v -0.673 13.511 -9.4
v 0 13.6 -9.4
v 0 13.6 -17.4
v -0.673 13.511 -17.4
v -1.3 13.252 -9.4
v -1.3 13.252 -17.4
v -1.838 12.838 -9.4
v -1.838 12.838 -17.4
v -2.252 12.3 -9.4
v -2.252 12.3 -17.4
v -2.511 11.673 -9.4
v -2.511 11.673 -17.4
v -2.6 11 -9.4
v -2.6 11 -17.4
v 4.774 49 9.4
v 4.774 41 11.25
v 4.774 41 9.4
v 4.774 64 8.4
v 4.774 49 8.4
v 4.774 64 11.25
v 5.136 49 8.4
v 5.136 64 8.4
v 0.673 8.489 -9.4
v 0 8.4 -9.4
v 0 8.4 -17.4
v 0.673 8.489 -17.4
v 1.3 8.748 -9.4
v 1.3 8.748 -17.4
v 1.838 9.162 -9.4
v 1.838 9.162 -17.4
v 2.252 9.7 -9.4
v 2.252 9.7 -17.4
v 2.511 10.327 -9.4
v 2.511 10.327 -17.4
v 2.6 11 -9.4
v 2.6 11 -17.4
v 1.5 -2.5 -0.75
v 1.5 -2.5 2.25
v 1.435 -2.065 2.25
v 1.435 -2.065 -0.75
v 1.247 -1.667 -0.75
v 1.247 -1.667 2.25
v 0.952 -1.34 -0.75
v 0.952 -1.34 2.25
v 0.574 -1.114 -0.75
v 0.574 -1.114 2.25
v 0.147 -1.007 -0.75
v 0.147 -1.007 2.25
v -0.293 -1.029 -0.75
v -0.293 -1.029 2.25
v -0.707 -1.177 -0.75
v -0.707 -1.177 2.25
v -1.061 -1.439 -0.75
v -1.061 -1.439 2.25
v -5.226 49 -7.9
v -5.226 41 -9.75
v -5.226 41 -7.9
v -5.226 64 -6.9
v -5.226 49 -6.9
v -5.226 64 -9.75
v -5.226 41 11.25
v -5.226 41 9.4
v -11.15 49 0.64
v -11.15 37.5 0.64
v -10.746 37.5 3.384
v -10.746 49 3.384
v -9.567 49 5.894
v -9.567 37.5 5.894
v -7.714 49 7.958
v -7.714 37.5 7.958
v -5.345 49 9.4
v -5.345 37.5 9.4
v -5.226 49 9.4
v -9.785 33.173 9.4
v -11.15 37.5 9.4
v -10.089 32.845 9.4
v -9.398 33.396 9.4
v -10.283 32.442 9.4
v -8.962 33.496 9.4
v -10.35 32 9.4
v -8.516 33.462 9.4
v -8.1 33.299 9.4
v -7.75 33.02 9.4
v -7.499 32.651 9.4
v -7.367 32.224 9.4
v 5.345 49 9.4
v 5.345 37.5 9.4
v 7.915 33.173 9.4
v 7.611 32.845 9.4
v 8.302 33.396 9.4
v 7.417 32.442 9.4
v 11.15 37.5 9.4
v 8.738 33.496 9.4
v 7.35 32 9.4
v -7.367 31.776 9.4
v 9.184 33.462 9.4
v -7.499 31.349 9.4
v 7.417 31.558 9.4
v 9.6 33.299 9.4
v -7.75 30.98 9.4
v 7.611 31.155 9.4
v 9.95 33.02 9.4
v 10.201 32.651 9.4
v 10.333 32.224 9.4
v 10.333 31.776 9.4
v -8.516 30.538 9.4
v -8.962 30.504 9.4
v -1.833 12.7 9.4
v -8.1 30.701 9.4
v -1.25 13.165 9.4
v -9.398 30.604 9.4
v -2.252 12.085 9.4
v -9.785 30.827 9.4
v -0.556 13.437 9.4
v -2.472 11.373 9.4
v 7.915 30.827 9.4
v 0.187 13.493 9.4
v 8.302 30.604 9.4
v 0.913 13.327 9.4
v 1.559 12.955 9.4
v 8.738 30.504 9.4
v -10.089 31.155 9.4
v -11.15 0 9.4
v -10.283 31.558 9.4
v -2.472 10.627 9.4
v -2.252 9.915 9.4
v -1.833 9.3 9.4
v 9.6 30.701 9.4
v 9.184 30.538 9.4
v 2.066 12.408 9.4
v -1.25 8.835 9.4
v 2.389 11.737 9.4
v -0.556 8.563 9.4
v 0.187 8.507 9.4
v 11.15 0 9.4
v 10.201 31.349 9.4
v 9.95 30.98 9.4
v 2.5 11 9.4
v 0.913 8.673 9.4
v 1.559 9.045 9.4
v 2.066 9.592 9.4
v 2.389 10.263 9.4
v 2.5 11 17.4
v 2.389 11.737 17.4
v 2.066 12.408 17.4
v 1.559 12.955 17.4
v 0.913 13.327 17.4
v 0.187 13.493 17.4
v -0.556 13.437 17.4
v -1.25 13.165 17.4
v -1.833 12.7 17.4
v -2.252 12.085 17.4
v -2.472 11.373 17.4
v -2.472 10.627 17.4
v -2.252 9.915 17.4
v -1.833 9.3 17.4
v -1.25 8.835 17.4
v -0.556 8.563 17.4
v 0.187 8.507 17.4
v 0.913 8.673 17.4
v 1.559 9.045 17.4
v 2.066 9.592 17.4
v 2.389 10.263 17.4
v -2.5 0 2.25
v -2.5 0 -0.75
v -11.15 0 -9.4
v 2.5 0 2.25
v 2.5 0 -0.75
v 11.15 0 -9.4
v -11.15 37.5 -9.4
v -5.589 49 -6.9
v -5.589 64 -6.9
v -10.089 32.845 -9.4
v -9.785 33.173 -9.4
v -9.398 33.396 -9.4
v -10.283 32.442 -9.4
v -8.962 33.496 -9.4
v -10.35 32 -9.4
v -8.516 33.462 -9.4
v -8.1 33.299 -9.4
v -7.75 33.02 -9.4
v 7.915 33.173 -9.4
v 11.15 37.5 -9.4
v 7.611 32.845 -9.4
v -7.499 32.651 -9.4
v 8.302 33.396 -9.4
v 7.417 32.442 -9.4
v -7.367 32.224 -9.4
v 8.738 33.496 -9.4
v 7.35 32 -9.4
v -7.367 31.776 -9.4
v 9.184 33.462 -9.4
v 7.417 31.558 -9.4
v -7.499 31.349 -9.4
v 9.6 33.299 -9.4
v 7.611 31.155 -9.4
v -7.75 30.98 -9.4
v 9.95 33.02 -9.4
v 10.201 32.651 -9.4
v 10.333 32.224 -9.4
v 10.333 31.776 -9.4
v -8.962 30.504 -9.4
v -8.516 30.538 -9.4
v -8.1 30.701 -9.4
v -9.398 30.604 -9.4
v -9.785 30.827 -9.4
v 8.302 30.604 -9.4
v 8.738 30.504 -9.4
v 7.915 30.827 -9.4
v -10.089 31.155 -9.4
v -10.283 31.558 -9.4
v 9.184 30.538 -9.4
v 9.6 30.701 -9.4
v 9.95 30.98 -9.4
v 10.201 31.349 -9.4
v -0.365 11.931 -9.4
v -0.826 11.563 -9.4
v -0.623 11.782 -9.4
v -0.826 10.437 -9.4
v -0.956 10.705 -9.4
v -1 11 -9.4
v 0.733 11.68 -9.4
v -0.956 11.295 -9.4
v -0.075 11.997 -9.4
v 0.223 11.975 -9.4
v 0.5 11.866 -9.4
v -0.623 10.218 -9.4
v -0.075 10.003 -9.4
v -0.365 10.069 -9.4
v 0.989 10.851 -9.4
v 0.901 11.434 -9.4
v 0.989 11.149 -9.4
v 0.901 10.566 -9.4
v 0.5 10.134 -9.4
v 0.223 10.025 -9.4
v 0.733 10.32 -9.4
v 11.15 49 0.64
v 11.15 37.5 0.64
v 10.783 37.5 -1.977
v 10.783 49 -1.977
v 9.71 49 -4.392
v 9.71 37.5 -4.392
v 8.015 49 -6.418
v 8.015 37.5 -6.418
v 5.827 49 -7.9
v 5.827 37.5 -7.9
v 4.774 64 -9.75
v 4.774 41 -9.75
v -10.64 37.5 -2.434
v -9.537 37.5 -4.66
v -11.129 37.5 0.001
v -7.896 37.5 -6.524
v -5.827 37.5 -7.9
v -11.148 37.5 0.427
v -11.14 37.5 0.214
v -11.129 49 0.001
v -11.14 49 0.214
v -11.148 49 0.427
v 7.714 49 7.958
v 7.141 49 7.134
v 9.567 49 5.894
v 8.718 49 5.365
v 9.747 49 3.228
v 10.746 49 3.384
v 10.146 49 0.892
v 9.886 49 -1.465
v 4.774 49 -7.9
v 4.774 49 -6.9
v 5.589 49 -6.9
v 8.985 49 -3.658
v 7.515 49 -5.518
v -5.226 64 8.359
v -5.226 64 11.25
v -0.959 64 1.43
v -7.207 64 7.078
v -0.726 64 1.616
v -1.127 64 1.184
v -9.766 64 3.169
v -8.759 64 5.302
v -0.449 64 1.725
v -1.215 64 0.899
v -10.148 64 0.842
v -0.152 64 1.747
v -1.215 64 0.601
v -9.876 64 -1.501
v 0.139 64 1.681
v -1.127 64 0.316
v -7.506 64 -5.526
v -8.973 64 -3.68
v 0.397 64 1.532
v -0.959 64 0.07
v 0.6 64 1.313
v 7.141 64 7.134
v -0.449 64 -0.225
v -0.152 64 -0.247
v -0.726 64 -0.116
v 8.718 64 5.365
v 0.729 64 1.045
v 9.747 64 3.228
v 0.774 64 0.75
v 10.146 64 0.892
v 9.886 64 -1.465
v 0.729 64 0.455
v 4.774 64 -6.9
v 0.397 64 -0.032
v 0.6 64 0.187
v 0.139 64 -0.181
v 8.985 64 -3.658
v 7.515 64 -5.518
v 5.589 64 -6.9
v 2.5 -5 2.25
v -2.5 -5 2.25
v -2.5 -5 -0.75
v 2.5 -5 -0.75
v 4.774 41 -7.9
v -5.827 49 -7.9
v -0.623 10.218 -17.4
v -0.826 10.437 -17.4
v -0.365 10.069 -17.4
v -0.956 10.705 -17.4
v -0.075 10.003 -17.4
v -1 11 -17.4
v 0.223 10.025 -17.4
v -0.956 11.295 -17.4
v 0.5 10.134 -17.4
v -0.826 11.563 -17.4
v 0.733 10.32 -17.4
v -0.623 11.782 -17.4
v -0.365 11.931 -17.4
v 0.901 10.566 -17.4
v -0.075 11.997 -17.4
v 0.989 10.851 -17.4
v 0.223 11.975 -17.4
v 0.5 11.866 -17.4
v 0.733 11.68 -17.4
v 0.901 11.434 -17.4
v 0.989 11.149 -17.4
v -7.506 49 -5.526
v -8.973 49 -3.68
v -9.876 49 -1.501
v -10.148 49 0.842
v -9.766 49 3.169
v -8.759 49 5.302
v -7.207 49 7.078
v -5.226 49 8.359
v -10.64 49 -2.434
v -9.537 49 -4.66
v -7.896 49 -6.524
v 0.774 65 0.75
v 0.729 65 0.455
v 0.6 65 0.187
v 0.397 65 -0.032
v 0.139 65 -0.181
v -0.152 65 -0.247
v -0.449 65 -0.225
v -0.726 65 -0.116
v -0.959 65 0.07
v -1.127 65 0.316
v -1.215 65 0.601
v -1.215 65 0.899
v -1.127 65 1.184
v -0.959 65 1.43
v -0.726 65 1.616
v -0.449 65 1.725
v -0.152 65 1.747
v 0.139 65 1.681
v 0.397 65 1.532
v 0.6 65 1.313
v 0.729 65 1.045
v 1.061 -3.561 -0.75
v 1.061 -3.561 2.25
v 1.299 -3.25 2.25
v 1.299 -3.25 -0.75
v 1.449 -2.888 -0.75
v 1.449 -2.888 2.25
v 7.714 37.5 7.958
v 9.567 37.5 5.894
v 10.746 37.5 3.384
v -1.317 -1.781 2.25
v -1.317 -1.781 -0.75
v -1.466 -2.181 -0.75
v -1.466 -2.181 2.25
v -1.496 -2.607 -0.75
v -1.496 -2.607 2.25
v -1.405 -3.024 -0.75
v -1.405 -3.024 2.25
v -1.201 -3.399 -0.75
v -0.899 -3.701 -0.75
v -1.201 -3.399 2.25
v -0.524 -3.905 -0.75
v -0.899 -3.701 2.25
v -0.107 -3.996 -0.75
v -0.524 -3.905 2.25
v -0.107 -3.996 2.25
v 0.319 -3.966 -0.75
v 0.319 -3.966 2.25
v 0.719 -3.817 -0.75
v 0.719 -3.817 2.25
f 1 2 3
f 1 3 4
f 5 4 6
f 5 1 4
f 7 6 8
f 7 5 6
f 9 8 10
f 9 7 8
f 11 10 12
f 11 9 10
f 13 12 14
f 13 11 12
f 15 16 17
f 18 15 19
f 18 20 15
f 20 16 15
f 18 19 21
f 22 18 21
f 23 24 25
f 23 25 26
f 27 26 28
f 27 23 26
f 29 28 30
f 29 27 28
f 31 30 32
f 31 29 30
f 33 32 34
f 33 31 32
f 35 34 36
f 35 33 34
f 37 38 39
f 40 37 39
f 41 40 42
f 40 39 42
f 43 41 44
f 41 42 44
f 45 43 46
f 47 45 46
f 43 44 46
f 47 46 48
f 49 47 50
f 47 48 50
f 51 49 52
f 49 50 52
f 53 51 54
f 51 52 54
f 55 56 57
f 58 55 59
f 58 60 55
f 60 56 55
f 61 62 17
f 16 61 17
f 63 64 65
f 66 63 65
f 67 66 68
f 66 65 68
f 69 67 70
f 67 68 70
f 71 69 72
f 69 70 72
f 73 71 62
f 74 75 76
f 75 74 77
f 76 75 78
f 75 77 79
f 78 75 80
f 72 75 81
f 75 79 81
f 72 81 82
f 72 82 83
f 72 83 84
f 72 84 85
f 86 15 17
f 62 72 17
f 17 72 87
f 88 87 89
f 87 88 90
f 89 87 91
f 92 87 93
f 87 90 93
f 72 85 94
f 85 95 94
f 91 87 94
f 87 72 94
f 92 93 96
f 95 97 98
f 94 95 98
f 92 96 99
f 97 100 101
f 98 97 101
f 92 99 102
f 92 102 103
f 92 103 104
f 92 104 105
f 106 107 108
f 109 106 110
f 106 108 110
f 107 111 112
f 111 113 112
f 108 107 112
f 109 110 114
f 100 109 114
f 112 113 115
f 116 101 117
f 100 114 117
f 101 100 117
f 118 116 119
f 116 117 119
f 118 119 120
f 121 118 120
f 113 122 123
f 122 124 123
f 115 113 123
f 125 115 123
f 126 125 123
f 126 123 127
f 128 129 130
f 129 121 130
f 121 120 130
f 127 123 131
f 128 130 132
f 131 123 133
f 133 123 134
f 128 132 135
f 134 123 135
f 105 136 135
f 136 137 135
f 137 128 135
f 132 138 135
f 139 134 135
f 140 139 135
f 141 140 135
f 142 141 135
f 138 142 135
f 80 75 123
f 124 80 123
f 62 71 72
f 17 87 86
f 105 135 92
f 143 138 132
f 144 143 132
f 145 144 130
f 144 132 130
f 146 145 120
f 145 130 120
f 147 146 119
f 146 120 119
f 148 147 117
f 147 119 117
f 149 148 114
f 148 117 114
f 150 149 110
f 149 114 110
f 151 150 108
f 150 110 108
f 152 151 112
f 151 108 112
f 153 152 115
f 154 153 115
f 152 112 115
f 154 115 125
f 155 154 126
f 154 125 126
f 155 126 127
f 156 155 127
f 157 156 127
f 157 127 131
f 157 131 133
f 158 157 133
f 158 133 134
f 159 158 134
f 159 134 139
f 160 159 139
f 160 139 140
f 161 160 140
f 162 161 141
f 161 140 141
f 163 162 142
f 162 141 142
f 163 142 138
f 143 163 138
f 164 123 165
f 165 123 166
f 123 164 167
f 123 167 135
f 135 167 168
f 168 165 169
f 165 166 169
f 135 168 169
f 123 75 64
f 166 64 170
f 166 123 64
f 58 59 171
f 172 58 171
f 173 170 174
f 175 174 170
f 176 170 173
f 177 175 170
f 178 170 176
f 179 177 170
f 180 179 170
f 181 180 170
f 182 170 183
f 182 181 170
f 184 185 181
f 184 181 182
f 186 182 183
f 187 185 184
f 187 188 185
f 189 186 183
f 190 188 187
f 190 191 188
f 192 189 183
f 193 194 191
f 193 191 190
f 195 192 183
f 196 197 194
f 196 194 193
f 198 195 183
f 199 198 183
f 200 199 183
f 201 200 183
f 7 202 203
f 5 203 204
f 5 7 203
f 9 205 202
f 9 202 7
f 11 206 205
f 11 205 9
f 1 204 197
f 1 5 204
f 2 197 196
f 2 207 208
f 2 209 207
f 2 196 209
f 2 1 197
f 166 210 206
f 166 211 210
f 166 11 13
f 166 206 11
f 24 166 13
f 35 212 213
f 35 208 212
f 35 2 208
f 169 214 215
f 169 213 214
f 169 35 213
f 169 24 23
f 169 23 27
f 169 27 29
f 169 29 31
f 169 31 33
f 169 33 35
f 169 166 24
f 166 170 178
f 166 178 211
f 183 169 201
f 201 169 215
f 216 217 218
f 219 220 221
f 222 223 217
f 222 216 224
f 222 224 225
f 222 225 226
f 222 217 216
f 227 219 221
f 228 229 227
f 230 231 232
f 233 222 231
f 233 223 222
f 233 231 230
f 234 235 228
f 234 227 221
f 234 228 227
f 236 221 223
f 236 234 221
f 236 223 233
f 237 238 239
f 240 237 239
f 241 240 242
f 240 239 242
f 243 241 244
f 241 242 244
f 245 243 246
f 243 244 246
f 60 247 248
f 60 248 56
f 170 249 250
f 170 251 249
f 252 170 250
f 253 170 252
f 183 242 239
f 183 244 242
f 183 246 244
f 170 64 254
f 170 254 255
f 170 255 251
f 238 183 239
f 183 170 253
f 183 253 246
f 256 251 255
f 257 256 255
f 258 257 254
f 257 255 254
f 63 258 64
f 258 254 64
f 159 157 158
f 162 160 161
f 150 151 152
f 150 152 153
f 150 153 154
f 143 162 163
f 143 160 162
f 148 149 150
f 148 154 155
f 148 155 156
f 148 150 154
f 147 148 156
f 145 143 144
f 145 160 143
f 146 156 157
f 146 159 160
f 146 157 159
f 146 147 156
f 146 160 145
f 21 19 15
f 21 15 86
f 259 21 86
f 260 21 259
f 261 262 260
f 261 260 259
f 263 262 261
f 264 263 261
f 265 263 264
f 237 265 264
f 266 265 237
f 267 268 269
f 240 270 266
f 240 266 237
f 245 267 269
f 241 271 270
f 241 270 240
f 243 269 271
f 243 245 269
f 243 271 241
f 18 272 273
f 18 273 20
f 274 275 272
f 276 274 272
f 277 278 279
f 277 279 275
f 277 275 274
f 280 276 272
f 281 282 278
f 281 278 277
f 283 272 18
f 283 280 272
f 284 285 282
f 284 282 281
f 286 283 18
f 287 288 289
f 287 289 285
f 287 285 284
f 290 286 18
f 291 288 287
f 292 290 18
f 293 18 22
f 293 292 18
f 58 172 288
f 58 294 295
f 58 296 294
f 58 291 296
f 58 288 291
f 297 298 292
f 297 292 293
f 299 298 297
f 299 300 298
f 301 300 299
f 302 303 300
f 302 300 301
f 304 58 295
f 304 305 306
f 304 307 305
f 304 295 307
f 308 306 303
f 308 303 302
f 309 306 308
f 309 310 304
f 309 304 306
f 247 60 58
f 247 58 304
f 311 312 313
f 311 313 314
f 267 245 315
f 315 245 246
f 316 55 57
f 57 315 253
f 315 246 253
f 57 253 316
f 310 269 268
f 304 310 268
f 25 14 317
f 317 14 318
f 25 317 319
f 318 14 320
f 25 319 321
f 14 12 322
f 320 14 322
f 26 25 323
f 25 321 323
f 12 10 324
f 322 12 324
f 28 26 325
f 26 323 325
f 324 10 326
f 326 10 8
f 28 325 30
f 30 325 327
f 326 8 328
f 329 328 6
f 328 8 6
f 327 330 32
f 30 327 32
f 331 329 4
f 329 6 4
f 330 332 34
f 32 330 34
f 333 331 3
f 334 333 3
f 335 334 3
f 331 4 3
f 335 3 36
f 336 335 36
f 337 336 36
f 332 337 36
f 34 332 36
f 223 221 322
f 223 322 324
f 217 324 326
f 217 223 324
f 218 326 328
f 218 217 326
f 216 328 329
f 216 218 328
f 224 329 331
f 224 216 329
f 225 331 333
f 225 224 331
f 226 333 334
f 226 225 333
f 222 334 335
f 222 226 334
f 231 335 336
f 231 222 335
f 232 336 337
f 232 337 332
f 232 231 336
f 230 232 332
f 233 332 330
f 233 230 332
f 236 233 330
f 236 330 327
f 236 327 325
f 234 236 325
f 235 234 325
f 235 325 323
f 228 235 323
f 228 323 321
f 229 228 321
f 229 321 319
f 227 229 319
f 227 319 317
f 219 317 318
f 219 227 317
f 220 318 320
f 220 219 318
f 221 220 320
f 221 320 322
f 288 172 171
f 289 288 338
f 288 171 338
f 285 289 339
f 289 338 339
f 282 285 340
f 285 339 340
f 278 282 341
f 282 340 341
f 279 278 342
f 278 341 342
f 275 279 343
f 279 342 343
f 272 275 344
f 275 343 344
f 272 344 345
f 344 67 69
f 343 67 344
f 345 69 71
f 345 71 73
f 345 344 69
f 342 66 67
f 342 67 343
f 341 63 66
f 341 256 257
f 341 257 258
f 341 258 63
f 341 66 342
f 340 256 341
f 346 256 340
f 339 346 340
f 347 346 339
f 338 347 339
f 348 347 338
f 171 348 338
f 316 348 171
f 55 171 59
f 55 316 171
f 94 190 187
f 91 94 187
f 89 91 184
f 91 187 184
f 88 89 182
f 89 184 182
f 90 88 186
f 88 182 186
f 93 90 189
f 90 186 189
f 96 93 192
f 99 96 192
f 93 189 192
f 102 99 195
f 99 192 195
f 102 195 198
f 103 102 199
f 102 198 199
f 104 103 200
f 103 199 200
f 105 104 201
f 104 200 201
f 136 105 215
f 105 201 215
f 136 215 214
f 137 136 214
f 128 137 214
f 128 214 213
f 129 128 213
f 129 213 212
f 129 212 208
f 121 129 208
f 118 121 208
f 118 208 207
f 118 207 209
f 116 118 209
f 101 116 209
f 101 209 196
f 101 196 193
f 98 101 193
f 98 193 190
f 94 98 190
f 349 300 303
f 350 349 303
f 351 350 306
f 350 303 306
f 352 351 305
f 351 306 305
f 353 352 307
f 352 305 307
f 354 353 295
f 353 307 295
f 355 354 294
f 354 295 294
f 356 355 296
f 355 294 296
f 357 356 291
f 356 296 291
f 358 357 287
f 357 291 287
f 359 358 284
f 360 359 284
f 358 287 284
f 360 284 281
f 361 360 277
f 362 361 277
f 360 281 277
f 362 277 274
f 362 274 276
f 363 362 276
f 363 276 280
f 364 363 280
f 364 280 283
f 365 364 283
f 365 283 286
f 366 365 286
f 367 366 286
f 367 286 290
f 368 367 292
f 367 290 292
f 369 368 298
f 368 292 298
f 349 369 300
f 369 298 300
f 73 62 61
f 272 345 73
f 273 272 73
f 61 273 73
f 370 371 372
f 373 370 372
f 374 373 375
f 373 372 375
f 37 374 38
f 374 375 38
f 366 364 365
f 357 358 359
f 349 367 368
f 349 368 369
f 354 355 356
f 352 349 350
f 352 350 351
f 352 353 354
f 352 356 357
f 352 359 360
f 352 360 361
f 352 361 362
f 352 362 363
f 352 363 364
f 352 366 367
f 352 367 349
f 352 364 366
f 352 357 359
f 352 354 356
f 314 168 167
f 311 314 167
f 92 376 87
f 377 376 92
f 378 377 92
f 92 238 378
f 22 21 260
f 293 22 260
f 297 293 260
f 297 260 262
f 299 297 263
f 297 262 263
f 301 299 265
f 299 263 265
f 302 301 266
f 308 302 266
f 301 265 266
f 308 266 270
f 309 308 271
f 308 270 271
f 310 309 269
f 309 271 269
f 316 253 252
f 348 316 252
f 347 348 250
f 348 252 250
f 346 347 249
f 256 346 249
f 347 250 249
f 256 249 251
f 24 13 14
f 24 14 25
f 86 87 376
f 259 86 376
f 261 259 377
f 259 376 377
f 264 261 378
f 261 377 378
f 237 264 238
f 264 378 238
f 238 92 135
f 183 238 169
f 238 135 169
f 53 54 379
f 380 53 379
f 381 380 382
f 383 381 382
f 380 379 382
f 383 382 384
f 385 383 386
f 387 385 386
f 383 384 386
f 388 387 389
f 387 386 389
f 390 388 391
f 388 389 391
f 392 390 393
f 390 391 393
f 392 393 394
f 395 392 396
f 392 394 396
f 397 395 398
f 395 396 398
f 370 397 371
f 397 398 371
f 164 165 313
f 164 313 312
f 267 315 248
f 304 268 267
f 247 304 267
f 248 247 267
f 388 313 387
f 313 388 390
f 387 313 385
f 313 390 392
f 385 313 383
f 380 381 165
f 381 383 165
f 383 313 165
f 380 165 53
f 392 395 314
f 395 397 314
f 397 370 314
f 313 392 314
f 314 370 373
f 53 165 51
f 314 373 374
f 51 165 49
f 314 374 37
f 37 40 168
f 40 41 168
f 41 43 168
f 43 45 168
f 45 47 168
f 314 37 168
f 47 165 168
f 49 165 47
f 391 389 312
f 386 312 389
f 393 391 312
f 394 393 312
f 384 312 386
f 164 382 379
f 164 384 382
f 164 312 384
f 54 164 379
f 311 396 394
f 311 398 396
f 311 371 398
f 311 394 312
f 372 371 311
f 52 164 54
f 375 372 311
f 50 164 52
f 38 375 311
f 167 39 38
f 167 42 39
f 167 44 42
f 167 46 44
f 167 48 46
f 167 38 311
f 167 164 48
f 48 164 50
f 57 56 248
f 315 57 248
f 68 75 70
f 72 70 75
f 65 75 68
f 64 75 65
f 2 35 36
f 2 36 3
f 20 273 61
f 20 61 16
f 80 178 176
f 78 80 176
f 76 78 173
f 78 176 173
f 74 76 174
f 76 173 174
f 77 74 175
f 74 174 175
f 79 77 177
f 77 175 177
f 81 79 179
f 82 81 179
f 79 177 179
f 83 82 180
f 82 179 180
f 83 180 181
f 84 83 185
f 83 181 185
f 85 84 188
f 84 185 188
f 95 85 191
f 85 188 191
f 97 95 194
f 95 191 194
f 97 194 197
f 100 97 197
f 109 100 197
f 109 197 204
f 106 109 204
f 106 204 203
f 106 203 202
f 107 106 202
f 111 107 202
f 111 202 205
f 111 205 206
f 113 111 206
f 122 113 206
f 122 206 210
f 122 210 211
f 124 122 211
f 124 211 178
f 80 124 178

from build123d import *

# Parameters (mm, degrees)
SKETCH_1_W          = 22.3
SKETCH_1_H          = 18.8
EXTRUDE_1_DEPTH     = 37.5
EXTRUDE_2_DEPTH     = 11.5
EXTRUDE_3_DEPTH     = 15
SKETCH_6_R          = 1
EXTRUDE_5_DEPTH     = 1
SKETCH_7_W          = 5
SKETCH_7_H          = 3
EXTRUDE_6_DEPTH     = 5
CUT_EXTRUDE_1_DEPTH = 12.65
SKETCH_9_R          = 1
EXTRUDE_7_DEPTH     = 8
SKETCH_10_R         = 2.5
EXTRUDE_8_DEPTH     = 8
EXTRUDE_9_DEPTH     = 23
SKETCH_12_R         = 1.5
CUT_EXTRUDE_2_DEPTH = 27.8


with BuildPart() as part:
    # 草图1 → 凸台-拉伸1 (new body)
    with BuildSketch(Plane(origin=(0, 0, 0), x_dir=(1, 0, 0), z_dir=(0, 1, 0))):
        Rectangle(SKETCH_1_W, SKETCH_1_H)
    extrude(amount=EXTRUDE_1_DEPTH)

    # 草图2 → 凸台-拉伸2 (add)
    with BuildSketch(Plane(origin=(0, 37.5, 0), x_dir=(1, 0, 0), z_dir=(0, 1, 0))):
        with BuildLine():
            Line((-5.34468737, -9.4), (5.34468737, -9.4))
            ThreePointArc((5.34468737, -9.4), (9.566941985, -5.894406054), (11.15, -0.63983183))
            ThreePointArc((11.15, -0.63983183), (9.710419772, 4.391536027), (5.827413939, 7.9))
            Line((5.827413939, 7.9), (0, 7.9))
            Line((0, 7.9), (-5.827413939, 7.9))
            ThreePointArc((-5.827413939, 7.9), (-9.536938213, 4.659739509), (-11.12855374, -0.001442574))
            ThreePointArc((-11.12855374, -0.001442574), (-11.144636924, -0.320457147), (-11.15, -0.639831856))
            ThreePointArc((-11.15, -0.639831856), (-9.566941978, -5.894406065), (-5.34468737, -9.4))
        make_face()
    extrude(amount=EXTRUDE_2_DEPTH)

    # 草图3 → 凸台-拉伸3 (add)
    with BuildSketch(Plane(origin=(0, 49, 0), x_dir=(1, 0, 0), z_dir=(0, 1, 0))):
        with BuildLine():
            Line((-5.135942831, -8.4), (5.135942831, -8.4))
            ThreePointArc((5.135942831, -8.4), (10.146278436, -0.891512764), (5.588518865, 6.9))
            Line((5.588518865, 6.9), (-5.588518865, 6.9))
            ThreePointArc((-5.588518865, 6.9), (-10.146278436, -0.891512764), (-5.135942831, -8.4))
        make_face()
    extrude(amount=EXTRUDE_3_DEPTH)

    # 草图6 → 凸台-拉伸5 (add)
    with BuildSketch(Plane(origin=(0, 64, 0), x_dir=(1, 0, 0), z_dir=(0, 1, 0))):
        with Locations((-0.226288017, -0.75)):
            Circle(SKETCH_6_R)
    extrude(amount=EXTRUDE_5_DEPTH)

    # 草图7 → 凸台-拉伸6 (add)
    with BuildSketch(Plane.XZ):
        with Locations((0, 0.75)):
            Rectangle(SKETCH_7_W, SKETCH_7_H)
    extrude(amount=EXTRUDE_6_DEPTH)

    # 草图8 → 切除-拉伸1 (cut, through all)
    with BuildSketch(Plane.XY.offset(2.25)):
        with BuildLine():
            ThreePointArc((1.5, -2.5), (0.574025149, -1.114180701), (-1.060660172, -1.439339828))
            Line((-1.060660172, -1.439339828), (1.060660172, -3.560660172))
            ThreePointArc((1.060660172, -3.560660172), (1.385819299, -3.074025149), (1.5, -2.5))
        make_face()
        with BuildLine():
            Line((1.060660172, -3.560660172), (-1.060660172, -1.439339828))
            ThreePointArc((-1.060660172, -1.439339828), (-1.060660172, -3.560660172), (1.060660172, -3.560660172))
        make_face()
    extrude(amount=-CUT_EXTRUDE_1_DEPTH, mode=Mode.SUBTRACT)

    # 草图9 → 凸台-拉伸7 (add)
    with BuildSketch(Plane(origin=(0, 0, -9.4), x_dir=(-1, 0, 0), z_dir=(0, 0, -1))):
        with BuildLine():
            Line((2.6, 11), (0, 8.4))
            ThreePointArc((0, 8.4), (-1.838477631, 9.161522369), (-2.6, 11))
            Line((-2.6, 11), (0, 13.6))
            ThreePointArc((0, 13.6), (1.838477631, 12.838477631), (2.6, 11))
        make_face()
        with Locations((0, 11)):
            Circle(SKETCH_9_R, mode=Mode.SUBTRACT)
    extrude(amount=EXTRUDE_7_DEPTH)

    # 草图10 → 凸台-拉伸8 (add)
    with BuildSketch(Plane.XY.offset(9.4)):
        with Locations((0, 11)):
            Circle(SKETCH_10_R)
    extrude(amount=EXTRUDE_8_DEPTH)

    # 草图11 → 凸台-拉伸9 (add)
    with BuildSketch(Plane(origin=(0, 64, 0), x_dir=(1, 0, 0), z_dir=(0, 1, 0))):
        with BuildLine():
            Line((-5.226288017, -6.705208095), (-5.226288017, -11.25))
            Line((-5.226288017, -11.25), (4.773711983, -11.25))
            Line((4.773711983, -11.25), (4.773711983, -6.705208095))
            ThreePointArc((4.773711983, -6.705208095), (7.549604437, -0.75), (4.773711983, 5.205208095))
            Line((4.773711983, 5.205208095), (4.773711983, 9.75))
            Line((4.773711983, 9.75), (-0.226288017, 9.75))
            Line((-0.226288017, 9.75), (-5.226288017, 9.75))
            Line((-5.226288017, 9.75), (-5.226288017, 5.205208095))
            ThreePointArc((-5.226288017, 5.205208095), (-8.002180472, -0.75), (-5.226288017, -6.705208095))
        make_face()
    extrude(amount=-EXTRUDE_9_DEPTH)

    # 草图12 → 切除-拉伸2 (cut, through all)
    with BuildSketch(Plane(origin=(0, 0, -9.4), x_dir=(-1, 0, 0), z_dir=(0, 0, -1))):
        with Locations((-8.85, 32)):
            Circle(SKETCH_12_R)
        with Locations((8.85, 32)):
            Circle(SKETCH_12_R)
    extrude(amount=-CUT_EXTRUDE_2_DEPTH, mode=Mode.SUBTRACT)


solid = part.part
